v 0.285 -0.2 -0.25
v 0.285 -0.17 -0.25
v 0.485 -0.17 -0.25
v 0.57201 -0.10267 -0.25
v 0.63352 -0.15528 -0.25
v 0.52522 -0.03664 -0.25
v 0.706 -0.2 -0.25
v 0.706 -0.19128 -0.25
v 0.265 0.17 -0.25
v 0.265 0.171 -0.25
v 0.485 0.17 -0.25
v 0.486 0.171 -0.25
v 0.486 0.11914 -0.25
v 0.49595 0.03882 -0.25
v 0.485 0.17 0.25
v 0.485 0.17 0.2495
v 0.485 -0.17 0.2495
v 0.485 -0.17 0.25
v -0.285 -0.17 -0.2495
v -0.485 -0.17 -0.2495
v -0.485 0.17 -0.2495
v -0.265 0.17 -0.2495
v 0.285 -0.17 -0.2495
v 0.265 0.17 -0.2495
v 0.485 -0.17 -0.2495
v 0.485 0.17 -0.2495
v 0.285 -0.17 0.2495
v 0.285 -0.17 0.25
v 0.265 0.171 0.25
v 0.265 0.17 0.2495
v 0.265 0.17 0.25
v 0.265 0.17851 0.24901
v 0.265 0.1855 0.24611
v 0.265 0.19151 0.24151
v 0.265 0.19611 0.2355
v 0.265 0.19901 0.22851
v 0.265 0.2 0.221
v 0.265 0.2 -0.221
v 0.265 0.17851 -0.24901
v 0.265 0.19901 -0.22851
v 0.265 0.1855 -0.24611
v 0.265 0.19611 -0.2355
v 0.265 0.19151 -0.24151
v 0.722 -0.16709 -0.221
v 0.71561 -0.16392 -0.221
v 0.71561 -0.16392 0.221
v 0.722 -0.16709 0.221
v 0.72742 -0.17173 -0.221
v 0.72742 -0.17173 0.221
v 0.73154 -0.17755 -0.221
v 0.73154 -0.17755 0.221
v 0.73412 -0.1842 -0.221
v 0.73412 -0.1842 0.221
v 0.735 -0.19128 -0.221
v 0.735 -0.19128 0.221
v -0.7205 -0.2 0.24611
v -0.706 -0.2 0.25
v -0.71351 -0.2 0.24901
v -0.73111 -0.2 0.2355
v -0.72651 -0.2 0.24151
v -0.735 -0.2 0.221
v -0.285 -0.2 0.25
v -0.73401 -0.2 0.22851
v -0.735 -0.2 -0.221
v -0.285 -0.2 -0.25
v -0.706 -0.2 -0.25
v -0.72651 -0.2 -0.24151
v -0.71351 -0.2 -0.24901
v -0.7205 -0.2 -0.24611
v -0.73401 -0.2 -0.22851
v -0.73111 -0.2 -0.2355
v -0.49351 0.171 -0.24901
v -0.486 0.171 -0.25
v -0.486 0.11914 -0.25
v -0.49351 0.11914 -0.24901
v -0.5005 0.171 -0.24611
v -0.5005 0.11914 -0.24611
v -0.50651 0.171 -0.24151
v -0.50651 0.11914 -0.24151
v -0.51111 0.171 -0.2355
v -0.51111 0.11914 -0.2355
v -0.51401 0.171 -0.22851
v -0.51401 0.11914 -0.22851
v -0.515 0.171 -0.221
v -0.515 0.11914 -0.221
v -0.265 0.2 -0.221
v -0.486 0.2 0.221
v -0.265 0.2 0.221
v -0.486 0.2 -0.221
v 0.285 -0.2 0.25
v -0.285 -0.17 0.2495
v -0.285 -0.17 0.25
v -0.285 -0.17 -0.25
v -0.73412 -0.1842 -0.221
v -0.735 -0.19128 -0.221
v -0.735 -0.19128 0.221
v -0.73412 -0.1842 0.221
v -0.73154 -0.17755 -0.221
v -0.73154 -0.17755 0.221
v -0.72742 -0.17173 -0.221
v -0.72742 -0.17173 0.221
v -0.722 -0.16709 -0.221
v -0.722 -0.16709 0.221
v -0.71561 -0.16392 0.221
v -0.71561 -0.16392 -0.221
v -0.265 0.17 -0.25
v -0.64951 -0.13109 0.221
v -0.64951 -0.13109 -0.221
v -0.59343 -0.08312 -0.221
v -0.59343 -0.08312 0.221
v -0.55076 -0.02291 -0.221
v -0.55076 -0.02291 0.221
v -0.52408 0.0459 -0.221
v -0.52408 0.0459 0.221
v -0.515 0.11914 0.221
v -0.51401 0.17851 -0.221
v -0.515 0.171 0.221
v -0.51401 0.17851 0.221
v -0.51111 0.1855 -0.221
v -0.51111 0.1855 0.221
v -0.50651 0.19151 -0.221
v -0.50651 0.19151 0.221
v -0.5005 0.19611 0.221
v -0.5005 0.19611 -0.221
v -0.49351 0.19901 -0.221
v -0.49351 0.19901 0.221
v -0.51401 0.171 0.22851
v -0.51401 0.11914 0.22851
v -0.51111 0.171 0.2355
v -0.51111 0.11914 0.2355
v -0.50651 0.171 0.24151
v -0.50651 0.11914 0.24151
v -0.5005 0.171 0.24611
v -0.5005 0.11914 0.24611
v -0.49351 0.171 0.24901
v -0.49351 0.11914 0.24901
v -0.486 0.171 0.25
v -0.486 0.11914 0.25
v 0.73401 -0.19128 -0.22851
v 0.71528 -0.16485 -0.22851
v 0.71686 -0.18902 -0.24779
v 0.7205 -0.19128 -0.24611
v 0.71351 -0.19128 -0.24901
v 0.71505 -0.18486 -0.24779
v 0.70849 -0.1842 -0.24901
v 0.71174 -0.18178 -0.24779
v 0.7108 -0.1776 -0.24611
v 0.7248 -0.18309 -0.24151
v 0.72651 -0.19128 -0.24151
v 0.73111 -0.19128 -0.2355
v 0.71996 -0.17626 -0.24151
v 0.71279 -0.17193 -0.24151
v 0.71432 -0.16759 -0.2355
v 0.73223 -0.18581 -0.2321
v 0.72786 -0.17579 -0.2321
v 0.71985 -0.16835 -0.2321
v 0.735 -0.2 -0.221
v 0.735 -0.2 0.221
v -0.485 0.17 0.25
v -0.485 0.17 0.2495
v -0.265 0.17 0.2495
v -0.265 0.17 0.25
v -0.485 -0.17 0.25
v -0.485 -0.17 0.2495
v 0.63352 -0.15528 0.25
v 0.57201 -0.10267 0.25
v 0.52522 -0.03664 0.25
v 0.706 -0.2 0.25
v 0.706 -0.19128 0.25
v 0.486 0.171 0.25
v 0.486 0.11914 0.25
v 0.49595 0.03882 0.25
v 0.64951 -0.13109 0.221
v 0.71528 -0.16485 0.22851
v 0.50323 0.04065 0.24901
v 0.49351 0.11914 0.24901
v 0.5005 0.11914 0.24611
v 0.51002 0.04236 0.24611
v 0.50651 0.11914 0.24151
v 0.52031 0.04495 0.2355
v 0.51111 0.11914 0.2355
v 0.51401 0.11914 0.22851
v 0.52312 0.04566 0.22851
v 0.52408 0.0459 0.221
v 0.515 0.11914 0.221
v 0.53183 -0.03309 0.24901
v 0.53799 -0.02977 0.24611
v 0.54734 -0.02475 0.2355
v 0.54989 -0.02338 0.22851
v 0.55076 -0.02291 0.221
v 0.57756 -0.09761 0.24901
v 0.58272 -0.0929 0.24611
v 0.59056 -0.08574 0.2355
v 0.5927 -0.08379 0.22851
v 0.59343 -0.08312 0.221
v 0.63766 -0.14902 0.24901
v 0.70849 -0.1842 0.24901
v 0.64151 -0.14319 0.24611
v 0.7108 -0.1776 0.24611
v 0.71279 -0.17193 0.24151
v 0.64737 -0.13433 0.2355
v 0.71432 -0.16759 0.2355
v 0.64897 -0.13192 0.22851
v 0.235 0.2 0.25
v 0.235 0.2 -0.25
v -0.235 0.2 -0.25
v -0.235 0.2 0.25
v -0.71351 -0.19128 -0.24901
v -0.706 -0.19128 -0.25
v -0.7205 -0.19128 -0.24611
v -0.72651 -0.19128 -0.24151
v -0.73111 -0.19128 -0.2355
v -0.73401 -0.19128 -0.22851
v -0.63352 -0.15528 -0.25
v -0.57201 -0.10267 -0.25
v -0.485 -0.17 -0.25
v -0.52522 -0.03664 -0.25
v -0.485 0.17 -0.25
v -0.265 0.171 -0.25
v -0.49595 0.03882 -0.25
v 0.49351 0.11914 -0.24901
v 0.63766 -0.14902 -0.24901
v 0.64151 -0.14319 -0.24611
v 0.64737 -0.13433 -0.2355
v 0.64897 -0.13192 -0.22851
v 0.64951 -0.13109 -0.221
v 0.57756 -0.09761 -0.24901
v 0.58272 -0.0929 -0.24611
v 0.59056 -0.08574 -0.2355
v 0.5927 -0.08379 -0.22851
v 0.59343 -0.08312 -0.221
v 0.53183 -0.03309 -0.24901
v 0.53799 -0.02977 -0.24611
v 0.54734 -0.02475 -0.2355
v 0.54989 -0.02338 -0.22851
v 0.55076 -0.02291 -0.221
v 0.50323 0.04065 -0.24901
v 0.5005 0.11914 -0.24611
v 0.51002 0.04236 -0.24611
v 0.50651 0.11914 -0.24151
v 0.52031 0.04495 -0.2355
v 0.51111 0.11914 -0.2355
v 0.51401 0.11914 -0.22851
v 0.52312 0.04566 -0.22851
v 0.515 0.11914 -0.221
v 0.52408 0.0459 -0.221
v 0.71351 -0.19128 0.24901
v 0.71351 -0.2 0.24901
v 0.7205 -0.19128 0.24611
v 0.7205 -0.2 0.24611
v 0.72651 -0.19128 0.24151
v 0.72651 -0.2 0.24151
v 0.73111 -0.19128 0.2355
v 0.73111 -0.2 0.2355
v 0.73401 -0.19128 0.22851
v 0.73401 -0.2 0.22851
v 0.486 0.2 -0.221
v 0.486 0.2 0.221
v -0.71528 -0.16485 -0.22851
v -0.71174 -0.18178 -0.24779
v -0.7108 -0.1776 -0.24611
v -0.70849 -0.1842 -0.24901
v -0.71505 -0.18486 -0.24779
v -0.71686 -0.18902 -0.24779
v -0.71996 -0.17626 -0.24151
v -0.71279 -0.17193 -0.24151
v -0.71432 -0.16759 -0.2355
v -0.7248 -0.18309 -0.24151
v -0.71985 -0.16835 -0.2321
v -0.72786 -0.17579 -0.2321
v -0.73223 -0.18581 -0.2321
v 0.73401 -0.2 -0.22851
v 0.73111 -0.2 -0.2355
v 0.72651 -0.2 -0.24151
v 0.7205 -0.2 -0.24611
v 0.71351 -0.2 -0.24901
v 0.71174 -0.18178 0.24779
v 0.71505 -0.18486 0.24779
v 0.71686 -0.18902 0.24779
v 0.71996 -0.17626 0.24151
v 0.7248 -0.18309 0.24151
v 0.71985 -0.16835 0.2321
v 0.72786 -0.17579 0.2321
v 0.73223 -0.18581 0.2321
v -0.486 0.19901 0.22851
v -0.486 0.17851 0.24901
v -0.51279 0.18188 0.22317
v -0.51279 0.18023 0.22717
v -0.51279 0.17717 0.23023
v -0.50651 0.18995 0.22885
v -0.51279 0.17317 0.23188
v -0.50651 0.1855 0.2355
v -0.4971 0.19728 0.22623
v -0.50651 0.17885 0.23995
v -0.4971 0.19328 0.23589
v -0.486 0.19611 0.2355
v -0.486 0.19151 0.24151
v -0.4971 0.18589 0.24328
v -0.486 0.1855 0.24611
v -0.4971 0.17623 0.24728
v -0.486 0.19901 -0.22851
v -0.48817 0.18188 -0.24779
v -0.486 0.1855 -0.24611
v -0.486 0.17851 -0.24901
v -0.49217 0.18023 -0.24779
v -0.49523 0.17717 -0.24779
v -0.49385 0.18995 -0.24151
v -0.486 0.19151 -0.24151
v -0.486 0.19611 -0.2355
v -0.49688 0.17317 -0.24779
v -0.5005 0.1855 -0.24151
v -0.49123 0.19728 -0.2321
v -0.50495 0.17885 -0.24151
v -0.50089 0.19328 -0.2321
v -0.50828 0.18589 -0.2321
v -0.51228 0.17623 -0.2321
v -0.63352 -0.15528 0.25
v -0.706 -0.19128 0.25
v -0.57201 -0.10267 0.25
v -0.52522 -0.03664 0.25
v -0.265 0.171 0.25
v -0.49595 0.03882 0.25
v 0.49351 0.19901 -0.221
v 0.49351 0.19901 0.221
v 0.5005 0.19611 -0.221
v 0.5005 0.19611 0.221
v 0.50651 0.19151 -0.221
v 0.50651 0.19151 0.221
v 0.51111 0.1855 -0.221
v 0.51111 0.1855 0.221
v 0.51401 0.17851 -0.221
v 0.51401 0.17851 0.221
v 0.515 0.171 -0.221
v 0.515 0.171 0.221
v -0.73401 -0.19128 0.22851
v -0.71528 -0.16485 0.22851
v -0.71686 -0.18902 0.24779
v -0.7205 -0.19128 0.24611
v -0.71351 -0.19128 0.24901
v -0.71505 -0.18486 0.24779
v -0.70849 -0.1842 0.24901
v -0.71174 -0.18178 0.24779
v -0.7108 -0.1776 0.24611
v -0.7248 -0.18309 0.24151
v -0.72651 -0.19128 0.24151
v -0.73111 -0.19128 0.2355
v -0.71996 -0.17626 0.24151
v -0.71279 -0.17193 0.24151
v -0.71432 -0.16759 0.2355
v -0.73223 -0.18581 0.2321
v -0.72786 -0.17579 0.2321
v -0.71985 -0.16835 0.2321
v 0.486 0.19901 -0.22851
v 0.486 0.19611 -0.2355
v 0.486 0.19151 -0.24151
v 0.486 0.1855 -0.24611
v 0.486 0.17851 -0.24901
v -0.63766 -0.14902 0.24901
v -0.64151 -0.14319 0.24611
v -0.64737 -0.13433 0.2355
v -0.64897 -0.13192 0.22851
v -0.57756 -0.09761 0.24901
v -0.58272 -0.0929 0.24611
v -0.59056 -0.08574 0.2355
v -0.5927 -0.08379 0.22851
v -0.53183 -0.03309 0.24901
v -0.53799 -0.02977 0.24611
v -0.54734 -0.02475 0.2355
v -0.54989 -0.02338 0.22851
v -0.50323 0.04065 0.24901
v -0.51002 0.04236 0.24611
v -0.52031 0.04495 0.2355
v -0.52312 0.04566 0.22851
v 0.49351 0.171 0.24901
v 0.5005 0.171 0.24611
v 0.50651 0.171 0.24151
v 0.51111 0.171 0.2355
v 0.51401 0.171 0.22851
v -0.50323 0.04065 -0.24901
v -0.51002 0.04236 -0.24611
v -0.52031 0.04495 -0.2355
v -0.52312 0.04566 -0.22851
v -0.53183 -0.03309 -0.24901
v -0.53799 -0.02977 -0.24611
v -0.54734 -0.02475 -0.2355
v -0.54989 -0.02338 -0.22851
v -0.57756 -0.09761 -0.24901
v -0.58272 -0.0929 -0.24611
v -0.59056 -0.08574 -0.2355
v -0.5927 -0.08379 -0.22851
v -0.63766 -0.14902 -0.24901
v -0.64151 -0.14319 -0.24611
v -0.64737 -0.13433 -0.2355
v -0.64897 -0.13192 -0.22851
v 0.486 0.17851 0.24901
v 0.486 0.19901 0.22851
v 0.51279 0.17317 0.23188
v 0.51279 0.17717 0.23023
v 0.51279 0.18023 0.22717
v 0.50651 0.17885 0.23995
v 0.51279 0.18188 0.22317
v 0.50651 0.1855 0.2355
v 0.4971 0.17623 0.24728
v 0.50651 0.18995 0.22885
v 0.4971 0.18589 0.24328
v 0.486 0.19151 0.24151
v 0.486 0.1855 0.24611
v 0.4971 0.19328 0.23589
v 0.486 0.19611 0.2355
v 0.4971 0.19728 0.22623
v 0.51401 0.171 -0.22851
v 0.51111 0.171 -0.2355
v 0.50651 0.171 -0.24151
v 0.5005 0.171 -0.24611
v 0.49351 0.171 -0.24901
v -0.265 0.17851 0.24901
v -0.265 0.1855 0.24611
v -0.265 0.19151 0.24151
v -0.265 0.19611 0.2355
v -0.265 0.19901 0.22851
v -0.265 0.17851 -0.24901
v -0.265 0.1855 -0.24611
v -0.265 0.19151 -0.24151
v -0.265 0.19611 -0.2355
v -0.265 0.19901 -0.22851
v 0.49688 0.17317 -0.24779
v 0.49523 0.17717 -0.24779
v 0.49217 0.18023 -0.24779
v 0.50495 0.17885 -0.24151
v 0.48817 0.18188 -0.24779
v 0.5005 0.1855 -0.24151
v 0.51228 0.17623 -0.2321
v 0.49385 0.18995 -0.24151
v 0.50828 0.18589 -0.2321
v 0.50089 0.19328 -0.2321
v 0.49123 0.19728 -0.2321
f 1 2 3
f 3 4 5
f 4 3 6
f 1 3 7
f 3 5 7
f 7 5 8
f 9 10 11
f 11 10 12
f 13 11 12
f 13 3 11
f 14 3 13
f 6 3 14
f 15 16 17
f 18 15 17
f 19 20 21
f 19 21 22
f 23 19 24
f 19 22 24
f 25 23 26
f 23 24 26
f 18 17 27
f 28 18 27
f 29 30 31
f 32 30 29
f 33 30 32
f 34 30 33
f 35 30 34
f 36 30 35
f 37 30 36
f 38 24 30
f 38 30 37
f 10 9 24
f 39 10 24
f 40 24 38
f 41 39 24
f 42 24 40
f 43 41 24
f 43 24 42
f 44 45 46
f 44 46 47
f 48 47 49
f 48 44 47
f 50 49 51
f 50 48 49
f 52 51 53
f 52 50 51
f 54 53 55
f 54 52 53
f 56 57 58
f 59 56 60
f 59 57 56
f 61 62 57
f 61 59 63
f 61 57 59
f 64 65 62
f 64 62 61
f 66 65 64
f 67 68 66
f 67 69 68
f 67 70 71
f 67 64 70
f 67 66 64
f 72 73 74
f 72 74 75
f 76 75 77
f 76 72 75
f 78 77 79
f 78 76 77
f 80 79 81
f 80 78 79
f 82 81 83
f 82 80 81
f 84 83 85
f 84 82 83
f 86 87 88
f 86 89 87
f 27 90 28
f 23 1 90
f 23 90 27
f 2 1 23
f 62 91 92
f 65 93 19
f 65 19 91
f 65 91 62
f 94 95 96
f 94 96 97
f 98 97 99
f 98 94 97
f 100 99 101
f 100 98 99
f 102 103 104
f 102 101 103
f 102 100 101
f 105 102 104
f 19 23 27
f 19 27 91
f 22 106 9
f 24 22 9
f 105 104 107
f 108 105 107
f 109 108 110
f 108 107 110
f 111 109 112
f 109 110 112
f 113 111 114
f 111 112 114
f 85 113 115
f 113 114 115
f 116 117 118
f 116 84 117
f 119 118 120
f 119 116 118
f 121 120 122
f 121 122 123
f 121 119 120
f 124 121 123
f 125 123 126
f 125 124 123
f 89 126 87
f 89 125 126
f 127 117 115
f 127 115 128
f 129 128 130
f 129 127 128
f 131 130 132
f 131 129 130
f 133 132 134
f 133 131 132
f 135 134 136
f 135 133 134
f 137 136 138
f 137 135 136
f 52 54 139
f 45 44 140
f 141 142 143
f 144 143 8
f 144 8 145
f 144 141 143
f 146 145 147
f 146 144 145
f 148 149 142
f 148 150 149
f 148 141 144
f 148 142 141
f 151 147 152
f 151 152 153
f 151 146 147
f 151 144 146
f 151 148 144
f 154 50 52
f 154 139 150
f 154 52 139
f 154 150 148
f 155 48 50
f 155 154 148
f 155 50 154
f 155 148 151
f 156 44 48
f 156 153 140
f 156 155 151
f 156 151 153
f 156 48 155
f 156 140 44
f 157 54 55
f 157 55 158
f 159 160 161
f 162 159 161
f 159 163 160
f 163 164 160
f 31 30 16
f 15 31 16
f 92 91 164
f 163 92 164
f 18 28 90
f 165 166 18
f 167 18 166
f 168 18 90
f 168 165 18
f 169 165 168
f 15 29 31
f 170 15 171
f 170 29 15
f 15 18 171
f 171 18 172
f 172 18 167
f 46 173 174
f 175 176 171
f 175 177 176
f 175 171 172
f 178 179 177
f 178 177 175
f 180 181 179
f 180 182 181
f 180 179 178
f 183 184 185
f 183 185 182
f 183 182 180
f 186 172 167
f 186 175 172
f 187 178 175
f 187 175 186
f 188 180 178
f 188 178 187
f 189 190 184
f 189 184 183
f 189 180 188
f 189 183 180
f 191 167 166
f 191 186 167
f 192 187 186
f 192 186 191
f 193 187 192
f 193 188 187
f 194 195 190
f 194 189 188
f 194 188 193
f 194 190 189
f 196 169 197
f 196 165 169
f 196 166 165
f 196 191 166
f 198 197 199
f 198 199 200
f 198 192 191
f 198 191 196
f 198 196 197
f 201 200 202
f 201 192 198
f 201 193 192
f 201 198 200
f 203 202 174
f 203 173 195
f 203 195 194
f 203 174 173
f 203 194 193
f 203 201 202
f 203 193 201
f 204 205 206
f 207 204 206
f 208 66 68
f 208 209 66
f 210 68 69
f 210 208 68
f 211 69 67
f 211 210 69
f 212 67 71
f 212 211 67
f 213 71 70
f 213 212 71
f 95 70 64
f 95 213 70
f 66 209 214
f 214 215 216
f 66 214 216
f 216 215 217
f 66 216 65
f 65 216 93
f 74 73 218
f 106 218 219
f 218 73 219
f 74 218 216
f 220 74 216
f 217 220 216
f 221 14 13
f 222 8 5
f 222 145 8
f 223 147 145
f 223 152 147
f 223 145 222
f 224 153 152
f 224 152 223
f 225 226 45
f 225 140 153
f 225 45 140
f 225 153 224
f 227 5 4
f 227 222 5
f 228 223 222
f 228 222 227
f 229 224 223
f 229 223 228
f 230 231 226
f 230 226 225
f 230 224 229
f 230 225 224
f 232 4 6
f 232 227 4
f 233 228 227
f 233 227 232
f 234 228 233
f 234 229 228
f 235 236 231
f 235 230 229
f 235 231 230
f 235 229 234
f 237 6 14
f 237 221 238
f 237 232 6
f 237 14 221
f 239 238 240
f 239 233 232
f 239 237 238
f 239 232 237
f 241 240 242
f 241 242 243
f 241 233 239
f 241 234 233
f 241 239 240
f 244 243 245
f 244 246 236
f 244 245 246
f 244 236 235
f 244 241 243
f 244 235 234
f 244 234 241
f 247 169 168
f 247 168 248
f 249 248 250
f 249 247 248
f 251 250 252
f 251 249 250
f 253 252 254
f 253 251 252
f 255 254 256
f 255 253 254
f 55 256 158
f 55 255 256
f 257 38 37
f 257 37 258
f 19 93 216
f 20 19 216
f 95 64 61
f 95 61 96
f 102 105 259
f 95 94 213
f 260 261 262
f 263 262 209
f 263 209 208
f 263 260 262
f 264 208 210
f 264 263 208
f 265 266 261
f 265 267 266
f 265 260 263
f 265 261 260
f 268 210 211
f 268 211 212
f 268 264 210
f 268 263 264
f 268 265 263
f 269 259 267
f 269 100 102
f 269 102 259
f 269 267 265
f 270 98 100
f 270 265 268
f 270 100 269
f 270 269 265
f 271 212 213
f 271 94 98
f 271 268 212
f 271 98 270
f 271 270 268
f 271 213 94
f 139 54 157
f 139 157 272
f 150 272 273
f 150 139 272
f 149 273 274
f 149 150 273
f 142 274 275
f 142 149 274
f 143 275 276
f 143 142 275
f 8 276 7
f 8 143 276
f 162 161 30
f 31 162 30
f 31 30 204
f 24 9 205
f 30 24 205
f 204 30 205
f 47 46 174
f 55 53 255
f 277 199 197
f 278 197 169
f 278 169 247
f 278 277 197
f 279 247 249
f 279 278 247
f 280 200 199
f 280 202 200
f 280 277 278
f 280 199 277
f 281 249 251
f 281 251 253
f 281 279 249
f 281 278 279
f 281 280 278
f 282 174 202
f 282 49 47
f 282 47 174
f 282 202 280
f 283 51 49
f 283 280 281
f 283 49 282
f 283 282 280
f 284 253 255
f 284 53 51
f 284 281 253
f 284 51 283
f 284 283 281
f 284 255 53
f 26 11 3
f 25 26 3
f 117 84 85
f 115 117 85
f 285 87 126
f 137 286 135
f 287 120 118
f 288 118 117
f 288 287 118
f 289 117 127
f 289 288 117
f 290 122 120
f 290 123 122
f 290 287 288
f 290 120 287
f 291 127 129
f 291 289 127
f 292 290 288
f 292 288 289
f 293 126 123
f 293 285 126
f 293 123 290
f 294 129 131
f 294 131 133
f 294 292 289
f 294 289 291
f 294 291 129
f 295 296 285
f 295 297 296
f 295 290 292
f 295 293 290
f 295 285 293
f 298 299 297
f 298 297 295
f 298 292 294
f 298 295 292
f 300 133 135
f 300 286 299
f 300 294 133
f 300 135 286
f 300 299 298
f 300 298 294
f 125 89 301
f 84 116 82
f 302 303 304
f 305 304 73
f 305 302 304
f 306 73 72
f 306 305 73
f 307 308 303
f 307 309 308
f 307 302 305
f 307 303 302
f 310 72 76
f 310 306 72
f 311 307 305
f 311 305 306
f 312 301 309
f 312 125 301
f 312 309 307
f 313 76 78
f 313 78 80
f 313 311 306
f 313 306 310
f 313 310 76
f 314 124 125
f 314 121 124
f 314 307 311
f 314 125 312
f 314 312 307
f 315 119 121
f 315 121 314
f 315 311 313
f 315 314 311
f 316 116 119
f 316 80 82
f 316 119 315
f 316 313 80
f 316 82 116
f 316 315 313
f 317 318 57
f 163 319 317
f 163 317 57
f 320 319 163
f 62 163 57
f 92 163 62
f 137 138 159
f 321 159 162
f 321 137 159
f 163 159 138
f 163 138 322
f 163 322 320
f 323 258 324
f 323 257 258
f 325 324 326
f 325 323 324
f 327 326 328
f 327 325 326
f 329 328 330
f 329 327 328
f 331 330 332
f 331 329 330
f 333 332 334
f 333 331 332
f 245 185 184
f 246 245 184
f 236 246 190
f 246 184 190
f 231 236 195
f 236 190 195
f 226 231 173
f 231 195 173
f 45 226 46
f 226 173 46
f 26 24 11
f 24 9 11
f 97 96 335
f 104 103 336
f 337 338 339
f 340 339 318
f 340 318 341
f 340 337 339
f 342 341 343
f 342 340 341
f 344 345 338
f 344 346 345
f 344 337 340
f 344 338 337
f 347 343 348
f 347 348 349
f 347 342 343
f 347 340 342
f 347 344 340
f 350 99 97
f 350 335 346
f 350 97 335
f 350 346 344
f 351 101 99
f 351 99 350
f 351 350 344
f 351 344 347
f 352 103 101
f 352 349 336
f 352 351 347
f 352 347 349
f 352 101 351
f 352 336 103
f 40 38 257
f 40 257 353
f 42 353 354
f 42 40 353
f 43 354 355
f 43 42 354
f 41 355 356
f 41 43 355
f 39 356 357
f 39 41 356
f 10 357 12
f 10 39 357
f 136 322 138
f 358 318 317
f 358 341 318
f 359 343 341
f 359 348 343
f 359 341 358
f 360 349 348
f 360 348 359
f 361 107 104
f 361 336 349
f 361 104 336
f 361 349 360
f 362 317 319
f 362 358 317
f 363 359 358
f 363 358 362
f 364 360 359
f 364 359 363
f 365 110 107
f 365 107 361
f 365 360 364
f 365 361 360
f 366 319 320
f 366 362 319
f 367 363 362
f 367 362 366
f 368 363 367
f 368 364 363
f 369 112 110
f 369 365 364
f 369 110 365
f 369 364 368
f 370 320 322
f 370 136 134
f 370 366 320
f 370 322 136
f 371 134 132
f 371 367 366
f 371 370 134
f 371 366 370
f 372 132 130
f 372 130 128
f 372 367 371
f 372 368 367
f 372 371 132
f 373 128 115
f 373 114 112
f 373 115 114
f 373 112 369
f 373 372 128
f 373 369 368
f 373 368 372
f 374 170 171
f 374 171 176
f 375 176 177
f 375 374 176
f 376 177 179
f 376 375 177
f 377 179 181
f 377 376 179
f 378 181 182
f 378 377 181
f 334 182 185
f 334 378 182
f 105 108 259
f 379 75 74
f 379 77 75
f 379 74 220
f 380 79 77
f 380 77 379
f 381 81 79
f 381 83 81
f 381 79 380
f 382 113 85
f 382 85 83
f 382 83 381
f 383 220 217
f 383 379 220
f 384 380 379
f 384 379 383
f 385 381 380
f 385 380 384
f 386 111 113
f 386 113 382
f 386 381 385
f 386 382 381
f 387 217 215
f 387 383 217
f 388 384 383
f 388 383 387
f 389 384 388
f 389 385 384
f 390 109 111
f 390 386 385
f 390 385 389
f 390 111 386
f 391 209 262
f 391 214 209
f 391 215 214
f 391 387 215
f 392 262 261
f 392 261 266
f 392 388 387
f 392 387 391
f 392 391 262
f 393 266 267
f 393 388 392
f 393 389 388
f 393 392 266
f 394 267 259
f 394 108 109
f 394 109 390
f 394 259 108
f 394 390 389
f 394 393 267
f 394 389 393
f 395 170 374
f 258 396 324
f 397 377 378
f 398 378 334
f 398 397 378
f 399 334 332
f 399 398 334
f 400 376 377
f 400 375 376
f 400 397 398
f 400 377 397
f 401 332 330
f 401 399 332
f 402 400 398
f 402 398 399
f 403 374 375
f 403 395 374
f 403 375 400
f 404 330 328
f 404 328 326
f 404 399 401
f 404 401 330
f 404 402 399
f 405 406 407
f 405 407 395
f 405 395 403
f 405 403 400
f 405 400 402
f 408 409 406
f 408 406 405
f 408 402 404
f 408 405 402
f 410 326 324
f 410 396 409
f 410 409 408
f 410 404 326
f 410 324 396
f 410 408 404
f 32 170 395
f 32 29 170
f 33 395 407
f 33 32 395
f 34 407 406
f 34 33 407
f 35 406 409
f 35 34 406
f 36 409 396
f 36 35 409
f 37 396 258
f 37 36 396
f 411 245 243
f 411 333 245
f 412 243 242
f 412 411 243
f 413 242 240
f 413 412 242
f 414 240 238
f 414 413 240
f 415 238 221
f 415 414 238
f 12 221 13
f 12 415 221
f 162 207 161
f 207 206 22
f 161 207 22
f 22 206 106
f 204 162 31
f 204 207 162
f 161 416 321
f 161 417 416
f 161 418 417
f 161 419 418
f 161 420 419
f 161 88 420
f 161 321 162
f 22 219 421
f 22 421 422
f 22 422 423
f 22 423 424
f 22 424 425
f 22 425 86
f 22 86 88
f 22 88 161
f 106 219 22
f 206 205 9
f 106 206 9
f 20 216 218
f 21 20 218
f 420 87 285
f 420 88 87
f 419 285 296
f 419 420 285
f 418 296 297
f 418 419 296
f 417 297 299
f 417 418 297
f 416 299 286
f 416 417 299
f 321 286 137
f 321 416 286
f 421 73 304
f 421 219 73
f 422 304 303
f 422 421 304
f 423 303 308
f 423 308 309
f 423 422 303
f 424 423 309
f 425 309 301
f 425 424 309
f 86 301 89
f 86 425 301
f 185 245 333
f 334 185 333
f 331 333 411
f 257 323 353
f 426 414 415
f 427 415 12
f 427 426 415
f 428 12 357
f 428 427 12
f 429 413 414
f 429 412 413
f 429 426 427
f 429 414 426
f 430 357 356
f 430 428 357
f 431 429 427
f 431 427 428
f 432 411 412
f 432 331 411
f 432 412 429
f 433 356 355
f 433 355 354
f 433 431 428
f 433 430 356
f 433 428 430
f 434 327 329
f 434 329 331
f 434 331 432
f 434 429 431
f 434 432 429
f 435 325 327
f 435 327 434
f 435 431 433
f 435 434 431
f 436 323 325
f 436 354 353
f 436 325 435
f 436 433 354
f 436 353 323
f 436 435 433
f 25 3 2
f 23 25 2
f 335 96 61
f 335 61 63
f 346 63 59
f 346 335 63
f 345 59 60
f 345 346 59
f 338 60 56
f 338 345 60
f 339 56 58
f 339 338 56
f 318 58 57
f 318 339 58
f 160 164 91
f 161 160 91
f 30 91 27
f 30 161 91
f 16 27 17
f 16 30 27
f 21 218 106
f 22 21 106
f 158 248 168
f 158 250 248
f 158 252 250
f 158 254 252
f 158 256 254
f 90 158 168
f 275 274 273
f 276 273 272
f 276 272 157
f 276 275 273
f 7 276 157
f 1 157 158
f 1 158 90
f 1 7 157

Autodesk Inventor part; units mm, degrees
ref_plane "YZ Plane" through (0, 0, 0) normal (1, 0, 0) x (0, 1, 0)
ref_plane "XZ Plane" through (0, 0, 0) normal (0, 1, 0) x (-1, 0, 0)
ref_plane "XY Plane" through (0, 0, 0) normal (0, 0, 1) x (1, 0, 0)
sketch "Sketch10" plane through (0, 0, 0) normal (0, 0, 1) x (1, 0, 0)
  line L0 (-0.485, 0.17) -> (0.485, 0.17)
  line L1 (0.485, 0.17) -> (0.485, -0.17)
  line L2 (0.485, -0.17) -> (-0.485, -0.17)
  line L3 (-0.485, -0.17) -> (-0.485, 0.17)
  line L4 (-0.265, 0.17) -> (-0.485, 0.17)
  line L5 (-0.515, 0.2) -> (-0.265, 0.2)
  line L6 (-0.265, 0.2) -> (-0.265, 0.17)
  line L7 (-0.515, 0.2) -> (-0.515, -0.17)
  line L8 (-0.485, -0.17) -> (-0.485, 0.17)
  line L9 (-0.285, -0.17) -> (-0.285, -0.2)
  line L10 (-0.285, -0.2) -> (-0.735, -0.2)
  line L11 (-0.735, -0.2) -> (-0.735, -0.17)
  line L12 (-0.735, -0.17) -> (-0.515, -0.17)
  line L13 (-0.485, -0.17) -> (-0.285, -0.17)
  line L14 (-0.265, 0.17) -> (0.265, 0.17)
  line L15 (0.265, 0.17) -> (0.235, 0.2)
  line L16 (0.235, 0.2) -> (-0.235, 0.2)
  line L17 (-0.235, 0.2) -> (-0.265, 0.17)
  point P0 (0, 0)
  point P1 (0, 0.17)
  point P2 (-0.485, 0)
  point P3 (0, 0.2)
  dimension "d11" = 0.2
  dimension "d12" = 0.45
  dimension "d13" = 0.03
  dimension "d14" = 0.03
  dimension "d15" = 0.25
  dimension "d16" = 45
  dimension "d19" = 0.03
  dimension "d21" = 1
  dimension "d22" = 0.4
extrude "Extrusion4" add sketch "Sketch10" along normal mid plane 0.499 contours L0 L1 L2 L3
extrude "Extrusion5" add sketch "Sketch10" along normal mid plane 0.5 contours L3 L2 L9 L10 L11 L12 L7 L5 L6 L0 | L17 L16 L15 L0
fillet "Fillet2" radius 0.3 1 edges at (-0.515, -0.17, 0)
fillet "Fillet3" radius 0.029 10 edges at (-0.39, 0.2, 0.25) (-0.515, 0.2, 0) (-0.39, 0.2, -0.25) (-0.5763, -0.0625, -0.25) (-0.515, 0.1596, -0.25) (-0.5763, -0.0625, 0.25) (-0.515, 0.1596, 0.25) (-0.735, -0.185, 0.25) (-0.735, -0.17, 0) (-0.735, -0.185, -0.25)
mirror "Mirror1" about plane through (0, 0, 0) normal (1, 0, 0) of "Extrusion5", "Fillet2", "Fillet3"
equation "\"d14\" = d13"
equation "\"d19\" = d13"
properties part number "RC0402FR-071KL Resistor"
